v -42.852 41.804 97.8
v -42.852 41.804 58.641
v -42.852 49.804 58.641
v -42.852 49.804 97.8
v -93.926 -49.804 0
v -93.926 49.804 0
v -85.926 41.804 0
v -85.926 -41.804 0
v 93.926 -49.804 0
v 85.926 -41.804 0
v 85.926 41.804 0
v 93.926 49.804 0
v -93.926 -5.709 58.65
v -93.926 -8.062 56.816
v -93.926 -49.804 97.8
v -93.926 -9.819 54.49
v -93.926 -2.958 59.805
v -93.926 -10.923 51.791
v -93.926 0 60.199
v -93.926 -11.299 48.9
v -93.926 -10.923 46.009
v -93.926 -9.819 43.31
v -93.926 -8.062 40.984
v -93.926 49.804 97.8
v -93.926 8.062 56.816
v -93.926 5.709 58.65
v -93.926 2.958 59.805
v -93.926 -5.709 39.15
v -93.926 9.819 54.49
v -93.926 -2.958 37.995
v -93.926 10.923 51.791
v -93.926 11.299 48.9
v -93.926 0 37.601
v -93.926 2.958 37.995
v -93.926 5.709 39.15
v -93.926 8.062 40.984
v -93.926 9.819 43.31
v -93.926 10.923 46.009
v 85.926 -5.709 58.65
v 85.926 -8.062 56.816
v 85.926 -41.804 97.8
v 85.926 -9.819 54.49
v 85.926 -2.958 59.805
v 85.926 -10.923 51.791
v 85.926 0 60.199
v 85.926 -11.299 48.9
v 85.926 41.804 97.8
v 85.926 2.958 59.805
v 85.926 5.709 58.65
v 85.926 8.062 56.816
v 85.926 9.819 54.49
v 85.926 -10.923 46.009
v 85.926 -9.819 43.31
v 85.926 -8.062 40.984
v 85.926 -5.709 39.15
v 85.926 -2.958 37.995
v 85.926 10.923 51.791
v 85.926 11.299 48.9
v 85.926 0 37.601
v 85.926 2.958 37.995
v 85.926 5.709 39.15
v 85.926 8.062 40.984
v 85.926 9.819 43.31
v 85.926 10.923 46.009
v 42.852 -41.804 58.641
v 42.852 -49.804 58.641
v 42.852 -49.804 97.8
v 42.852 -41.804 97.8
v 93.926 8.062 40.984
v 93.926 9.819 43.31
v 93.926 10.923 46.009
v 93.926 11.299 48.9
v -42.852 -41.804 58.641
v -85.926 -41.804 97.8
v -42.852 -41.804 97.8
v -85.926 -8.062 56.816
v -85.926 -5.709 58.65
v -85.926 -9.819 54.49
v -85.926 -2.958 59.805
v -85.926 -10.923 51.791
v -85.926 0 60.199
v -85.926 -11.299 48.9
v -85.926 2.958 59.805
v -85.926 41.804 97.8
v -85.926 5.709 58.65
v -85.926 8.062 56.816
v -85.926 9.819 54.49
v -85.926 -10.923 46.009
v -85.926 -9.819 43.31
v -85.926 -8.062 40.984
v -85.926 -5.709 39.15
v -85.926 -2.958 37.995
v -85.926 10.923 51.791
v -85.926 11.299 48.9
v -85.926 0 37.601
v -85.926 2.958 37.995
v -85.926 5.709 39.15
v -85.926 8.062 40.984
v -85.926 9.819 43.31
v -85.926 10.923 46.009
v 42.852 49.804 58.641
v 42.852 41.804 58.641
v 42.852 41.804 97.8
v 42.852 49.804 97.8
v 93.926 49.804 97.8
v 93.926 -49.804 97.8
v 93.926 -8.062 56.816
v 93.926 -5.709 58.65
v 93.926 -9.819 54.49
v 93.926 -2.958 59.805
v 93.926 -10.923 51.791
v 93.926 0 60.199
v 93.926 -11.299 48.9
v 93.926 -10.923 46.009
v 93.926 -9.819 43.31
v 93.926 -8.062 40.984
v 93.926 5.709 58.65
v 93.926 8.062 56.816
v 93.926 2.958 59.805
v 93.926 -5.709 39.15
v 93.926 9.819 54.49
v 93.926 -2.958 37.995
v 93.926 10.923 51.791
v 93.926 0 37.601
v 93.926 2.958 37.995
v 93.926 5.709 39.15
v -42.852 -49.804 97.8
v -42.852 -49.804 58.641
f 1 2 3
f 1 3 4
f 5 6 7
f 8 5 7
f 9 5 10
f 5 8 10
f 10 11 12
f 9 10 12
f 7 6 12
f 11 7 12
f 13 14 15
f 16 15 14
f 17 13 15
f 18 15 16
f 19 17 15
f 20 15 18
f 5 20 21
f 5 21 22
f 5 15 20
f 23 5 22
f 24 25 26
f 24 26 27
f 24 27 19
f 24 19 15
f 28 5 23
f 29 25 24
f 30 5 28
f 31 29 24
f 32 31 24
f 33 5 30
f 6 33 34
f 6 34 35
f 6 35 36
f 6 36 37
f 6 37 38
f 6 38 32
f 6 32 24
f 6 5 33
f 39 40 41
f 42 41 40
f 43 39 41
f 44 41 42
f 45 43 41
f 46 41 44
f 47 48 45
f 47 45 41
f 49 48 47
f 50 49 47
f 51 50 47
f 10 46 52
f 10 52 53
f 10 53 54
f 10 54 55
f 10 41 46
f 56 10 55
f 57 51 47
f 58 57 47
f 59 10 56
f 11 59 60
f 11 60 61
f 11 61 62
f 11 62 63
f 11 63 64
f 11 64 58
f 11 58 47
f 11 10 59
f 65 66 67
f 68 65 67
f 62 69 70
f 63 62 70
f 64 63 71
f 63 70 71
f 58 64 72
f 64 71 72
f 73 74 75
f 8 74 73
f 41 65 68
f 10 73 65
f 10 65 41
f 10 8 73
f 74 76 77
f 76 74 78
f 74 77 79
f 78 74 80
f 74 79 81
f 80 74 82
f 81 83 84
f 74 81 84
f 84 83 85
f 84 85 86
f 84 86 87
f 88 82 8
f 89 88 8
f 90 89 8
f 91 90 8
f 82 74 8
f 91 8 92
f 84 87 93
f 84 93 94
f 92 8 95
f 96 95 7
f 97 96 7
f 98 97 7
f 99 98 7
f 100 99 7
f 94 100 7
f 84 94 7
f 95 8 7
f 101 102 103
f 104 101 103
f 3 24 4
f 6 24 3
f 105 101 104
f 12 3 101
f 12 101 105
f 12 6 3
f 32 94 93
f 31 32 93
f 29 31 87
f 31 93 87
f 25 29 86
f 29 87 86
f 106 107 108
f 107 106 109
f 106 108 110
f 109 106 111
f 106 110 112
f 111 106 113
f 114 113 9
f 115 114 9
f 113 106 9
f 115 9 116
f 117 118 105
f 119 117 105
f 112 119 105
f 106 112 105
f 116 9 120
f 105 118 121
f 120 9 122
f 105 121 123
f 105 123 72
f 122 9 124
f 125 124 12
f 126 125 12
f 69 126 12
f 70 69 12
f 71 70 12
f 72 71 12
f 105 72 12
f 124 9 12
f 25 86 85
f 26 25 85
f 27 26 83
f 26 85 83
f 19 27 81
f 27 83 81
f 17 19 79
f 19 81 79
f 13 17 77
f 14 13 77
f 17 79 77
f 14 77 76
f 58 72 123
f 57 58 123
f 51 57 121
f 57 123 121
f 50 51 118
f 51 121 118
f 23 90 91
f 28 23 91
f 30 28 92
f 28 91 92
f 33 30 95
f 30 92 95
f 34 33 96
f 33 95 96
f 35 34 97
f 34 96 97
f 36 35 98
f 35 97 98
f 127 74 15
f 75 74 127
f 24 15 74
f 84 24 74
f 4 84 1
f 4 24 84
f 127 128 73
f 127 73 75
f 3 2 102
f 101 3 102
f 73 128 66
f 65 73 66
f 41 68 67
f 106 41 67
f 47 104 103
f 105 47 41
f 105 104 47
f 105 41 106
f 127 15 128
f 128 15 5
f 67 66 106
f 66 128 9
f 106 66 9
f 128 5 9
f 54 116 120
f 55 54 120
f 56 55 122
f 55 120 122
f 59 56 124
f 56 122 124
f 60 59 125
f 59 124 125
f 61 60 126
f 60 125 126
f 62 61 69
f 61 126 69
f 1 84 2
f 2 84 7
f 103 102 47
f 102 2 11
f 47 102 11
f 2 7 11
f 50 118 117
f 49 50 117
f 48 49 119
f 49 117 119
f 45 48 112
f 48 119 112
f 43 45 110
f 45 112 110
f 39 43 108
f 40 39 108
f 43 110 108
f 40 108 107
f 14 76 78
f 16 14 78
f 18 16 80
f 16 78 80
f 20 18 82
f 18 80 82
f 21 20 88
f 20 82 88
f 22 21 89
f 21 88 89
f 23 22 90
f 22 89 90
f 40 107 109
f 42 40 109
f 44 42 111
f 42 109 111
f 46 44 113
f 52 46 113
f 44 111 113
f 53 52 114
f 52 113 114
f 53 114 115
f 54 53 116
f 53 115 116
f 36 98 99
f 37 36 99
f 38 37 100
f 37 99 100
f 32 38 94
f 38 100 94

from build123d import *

# Parameters (mm, degrees)
F0_W     = 187.8524124622
F0_H     = 99.6085852385
F0_W_2   = 171.8524098396
F0_H_2   = 83.6085826159
F1_DEPTH = 97.8
F3_DEPTH = 187.8534124622
F4_W     = 85.7032239437
F4_H     = 39.1587115705
F5_DEPTH = 99.6095852385


with BuildPart() as f1:
    # F0 (on Top) → F1 (new body)
    with BuildSketch(Plane.XY):
        Rectangle(F0_W, F0_H)
        Rectangle(F0_W_2, F0_H_2, mode=Mode.SUBTRACT)
    extrude(amount=F1_DEPTH)

    # F2 (on face) → F3 (cut, through all)
    with BuildSketch(Plane.YZ.offset(93.9262062311)):
        with BuildLine():
            Line((0, 48.9), (-8.06236551, 56.8159777743))
            ThreePointArc((-8.06236551, 56.8159777743), (-11.2988690469, 48.9), (-8.06236551, 40.9840222257))
            Line((-8.06236551, 40.9840222257), (0, 48.9))
        make_face()
        with BuildLine():
            Line((8.06236551, 40.9840222257), (0, 48.9))
            Line((0, 48.9), (-8.06236551, 40.9840222257))
            ThreePointArc((-8.06236551, 40.9840222257), (0, 37.6011309531), (8.06236551, 40.9840222257))
        make_face()
        with BuildLine():
            Line((8.06236551, 56.8159777743), (0, 48.9))
            Line((0, 48.9), (8.06236551, 40.9840222257))
            ThreePointArc((8.06236551, 40.9840222257), (10.4584906618, 44.6239720748), (11.2988690469, 48.9))
            ThreePointArc((11.2988690469, 48.9), (10.4584906618, 53.1760279252), (8.06236551, 56.8159777743))
        make_face()
        with BuildLine():
            ThreePointArc((8.06236551, 56.8159777743), (0, 60.1988690469), (-8.06236551, 56.8159777743))
            Line((-8.06236551, 56.8159777743), (0, 48.9))
            Line((0, 48.9), (8.06236551, 56.8159777743))
        make_face()
    extrude(amount=-F3_DEPTH, mode=Mode.SUBTRACT)

    # F4 (on face) → F5 (cut, through all)
    with BuildSketch(Plane.XZ.offset(49.8042926192)):
        with Locations((0, 78.2206442147)):
            Rectangle(F4_W, F4_H)
    extrude(amount=-F5_DEPTH, mode=Mode.SUBTRACT)


solid = f1.part
